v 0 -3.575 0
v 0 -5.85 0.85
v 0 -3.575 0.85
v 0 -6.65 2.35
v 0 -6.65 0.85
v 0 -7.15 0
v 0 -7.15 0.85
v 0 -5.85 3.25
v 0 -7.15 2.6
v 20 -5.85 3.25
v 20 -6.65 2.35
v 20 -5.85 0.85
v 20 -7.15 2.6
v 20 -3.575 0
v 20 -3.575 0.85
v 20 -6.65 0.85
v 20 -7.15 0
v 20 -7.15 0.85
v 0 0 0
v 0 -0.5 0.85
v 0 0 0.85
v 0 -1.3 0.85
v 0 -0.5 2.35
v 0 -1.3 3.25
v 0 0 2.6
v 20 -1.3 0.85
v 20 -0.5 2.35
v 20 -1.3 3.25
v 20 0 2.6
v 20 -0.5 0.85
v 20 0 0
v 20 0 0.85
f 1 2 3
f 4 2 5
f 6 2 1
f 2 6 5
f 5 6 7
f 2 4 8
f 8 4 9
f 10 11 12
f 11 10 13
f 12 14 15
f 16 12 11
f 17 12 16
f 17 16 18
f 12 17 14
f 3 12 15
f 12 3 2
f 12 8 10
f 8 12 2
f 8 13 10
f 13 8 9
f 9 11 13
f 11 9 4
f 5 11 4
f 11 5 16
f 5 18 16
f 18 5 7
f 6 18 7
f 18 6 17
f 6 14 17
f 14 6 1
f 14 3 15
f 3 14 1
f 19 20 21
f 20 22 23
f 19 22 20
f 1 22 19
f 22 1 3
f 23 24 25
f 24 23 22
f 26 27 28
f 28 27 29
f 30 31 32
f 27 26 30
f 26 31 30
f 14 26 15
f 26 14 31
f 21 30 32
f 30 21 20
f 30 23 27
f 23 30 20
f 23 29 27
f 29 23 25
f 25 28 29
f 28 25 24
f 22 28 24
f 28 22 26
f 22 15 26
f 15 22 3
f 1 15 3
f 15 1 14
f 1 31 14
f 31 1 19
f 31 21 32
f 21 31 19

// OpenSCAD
/*
    Author: Daniel Devine
    Date: 13/01/17
    Description: T-Slot aluminium cover for the extrusions used for the Anet A2.
    Particularly useful for running the x-axis endstop wire separately from the X-axis belt.
    Either adjust the length in the OpenSCAD file or stretch along the x-axis in your slicer.
*/

length = 20; // The length of the extrusion.
base_width = 7.15;
base_thickness = 0.85;
sidewall_thickness = 0.8;
sidewall_offset = 1-.5;
part_height = 4.1;
un_overhang = 0.25; // 0.25 prints better, but 0 would be optimal for functionality.

// Build the object
rotate([90, 0, 90]){
    union(){
        // First half
        translate([-(base_width), 0, 0]){
            linear_extrude(length) half_extrusion();
        };
        // Second half
        linear_extrude(length) mirror([1, 0, 0]) half_extrusion();
    }   
}
        


module half_extrusion(){
    // Half the extrusion is modelled so that there is less description of the polygon needed.
    polygon(points=[
            [0,0], // origin 
            [base_width/2, 0],
            [base_width/2 , base_thickness],
            [sidewall_offset + sidewall_thickness, base_thickness],
            [sidewall_offset + sidewall_thickness, part_height - base_thickness], // This is the highest point.
            [0, part_height - (sidewall_thickness * 1.875)], // Down roughly 45deg to make a point that sticks out to anchor under lip of extrusion Multiply sidewall by 1.8 to keep linear?
            [sidewall_offset, part_height - (sidewall_thickness * 1.875) - un_overhang], // back in...
            [sidewall_offset, base_thickness],
            [0, base_thickness],
            [0, 0]
        ]
    );
}
